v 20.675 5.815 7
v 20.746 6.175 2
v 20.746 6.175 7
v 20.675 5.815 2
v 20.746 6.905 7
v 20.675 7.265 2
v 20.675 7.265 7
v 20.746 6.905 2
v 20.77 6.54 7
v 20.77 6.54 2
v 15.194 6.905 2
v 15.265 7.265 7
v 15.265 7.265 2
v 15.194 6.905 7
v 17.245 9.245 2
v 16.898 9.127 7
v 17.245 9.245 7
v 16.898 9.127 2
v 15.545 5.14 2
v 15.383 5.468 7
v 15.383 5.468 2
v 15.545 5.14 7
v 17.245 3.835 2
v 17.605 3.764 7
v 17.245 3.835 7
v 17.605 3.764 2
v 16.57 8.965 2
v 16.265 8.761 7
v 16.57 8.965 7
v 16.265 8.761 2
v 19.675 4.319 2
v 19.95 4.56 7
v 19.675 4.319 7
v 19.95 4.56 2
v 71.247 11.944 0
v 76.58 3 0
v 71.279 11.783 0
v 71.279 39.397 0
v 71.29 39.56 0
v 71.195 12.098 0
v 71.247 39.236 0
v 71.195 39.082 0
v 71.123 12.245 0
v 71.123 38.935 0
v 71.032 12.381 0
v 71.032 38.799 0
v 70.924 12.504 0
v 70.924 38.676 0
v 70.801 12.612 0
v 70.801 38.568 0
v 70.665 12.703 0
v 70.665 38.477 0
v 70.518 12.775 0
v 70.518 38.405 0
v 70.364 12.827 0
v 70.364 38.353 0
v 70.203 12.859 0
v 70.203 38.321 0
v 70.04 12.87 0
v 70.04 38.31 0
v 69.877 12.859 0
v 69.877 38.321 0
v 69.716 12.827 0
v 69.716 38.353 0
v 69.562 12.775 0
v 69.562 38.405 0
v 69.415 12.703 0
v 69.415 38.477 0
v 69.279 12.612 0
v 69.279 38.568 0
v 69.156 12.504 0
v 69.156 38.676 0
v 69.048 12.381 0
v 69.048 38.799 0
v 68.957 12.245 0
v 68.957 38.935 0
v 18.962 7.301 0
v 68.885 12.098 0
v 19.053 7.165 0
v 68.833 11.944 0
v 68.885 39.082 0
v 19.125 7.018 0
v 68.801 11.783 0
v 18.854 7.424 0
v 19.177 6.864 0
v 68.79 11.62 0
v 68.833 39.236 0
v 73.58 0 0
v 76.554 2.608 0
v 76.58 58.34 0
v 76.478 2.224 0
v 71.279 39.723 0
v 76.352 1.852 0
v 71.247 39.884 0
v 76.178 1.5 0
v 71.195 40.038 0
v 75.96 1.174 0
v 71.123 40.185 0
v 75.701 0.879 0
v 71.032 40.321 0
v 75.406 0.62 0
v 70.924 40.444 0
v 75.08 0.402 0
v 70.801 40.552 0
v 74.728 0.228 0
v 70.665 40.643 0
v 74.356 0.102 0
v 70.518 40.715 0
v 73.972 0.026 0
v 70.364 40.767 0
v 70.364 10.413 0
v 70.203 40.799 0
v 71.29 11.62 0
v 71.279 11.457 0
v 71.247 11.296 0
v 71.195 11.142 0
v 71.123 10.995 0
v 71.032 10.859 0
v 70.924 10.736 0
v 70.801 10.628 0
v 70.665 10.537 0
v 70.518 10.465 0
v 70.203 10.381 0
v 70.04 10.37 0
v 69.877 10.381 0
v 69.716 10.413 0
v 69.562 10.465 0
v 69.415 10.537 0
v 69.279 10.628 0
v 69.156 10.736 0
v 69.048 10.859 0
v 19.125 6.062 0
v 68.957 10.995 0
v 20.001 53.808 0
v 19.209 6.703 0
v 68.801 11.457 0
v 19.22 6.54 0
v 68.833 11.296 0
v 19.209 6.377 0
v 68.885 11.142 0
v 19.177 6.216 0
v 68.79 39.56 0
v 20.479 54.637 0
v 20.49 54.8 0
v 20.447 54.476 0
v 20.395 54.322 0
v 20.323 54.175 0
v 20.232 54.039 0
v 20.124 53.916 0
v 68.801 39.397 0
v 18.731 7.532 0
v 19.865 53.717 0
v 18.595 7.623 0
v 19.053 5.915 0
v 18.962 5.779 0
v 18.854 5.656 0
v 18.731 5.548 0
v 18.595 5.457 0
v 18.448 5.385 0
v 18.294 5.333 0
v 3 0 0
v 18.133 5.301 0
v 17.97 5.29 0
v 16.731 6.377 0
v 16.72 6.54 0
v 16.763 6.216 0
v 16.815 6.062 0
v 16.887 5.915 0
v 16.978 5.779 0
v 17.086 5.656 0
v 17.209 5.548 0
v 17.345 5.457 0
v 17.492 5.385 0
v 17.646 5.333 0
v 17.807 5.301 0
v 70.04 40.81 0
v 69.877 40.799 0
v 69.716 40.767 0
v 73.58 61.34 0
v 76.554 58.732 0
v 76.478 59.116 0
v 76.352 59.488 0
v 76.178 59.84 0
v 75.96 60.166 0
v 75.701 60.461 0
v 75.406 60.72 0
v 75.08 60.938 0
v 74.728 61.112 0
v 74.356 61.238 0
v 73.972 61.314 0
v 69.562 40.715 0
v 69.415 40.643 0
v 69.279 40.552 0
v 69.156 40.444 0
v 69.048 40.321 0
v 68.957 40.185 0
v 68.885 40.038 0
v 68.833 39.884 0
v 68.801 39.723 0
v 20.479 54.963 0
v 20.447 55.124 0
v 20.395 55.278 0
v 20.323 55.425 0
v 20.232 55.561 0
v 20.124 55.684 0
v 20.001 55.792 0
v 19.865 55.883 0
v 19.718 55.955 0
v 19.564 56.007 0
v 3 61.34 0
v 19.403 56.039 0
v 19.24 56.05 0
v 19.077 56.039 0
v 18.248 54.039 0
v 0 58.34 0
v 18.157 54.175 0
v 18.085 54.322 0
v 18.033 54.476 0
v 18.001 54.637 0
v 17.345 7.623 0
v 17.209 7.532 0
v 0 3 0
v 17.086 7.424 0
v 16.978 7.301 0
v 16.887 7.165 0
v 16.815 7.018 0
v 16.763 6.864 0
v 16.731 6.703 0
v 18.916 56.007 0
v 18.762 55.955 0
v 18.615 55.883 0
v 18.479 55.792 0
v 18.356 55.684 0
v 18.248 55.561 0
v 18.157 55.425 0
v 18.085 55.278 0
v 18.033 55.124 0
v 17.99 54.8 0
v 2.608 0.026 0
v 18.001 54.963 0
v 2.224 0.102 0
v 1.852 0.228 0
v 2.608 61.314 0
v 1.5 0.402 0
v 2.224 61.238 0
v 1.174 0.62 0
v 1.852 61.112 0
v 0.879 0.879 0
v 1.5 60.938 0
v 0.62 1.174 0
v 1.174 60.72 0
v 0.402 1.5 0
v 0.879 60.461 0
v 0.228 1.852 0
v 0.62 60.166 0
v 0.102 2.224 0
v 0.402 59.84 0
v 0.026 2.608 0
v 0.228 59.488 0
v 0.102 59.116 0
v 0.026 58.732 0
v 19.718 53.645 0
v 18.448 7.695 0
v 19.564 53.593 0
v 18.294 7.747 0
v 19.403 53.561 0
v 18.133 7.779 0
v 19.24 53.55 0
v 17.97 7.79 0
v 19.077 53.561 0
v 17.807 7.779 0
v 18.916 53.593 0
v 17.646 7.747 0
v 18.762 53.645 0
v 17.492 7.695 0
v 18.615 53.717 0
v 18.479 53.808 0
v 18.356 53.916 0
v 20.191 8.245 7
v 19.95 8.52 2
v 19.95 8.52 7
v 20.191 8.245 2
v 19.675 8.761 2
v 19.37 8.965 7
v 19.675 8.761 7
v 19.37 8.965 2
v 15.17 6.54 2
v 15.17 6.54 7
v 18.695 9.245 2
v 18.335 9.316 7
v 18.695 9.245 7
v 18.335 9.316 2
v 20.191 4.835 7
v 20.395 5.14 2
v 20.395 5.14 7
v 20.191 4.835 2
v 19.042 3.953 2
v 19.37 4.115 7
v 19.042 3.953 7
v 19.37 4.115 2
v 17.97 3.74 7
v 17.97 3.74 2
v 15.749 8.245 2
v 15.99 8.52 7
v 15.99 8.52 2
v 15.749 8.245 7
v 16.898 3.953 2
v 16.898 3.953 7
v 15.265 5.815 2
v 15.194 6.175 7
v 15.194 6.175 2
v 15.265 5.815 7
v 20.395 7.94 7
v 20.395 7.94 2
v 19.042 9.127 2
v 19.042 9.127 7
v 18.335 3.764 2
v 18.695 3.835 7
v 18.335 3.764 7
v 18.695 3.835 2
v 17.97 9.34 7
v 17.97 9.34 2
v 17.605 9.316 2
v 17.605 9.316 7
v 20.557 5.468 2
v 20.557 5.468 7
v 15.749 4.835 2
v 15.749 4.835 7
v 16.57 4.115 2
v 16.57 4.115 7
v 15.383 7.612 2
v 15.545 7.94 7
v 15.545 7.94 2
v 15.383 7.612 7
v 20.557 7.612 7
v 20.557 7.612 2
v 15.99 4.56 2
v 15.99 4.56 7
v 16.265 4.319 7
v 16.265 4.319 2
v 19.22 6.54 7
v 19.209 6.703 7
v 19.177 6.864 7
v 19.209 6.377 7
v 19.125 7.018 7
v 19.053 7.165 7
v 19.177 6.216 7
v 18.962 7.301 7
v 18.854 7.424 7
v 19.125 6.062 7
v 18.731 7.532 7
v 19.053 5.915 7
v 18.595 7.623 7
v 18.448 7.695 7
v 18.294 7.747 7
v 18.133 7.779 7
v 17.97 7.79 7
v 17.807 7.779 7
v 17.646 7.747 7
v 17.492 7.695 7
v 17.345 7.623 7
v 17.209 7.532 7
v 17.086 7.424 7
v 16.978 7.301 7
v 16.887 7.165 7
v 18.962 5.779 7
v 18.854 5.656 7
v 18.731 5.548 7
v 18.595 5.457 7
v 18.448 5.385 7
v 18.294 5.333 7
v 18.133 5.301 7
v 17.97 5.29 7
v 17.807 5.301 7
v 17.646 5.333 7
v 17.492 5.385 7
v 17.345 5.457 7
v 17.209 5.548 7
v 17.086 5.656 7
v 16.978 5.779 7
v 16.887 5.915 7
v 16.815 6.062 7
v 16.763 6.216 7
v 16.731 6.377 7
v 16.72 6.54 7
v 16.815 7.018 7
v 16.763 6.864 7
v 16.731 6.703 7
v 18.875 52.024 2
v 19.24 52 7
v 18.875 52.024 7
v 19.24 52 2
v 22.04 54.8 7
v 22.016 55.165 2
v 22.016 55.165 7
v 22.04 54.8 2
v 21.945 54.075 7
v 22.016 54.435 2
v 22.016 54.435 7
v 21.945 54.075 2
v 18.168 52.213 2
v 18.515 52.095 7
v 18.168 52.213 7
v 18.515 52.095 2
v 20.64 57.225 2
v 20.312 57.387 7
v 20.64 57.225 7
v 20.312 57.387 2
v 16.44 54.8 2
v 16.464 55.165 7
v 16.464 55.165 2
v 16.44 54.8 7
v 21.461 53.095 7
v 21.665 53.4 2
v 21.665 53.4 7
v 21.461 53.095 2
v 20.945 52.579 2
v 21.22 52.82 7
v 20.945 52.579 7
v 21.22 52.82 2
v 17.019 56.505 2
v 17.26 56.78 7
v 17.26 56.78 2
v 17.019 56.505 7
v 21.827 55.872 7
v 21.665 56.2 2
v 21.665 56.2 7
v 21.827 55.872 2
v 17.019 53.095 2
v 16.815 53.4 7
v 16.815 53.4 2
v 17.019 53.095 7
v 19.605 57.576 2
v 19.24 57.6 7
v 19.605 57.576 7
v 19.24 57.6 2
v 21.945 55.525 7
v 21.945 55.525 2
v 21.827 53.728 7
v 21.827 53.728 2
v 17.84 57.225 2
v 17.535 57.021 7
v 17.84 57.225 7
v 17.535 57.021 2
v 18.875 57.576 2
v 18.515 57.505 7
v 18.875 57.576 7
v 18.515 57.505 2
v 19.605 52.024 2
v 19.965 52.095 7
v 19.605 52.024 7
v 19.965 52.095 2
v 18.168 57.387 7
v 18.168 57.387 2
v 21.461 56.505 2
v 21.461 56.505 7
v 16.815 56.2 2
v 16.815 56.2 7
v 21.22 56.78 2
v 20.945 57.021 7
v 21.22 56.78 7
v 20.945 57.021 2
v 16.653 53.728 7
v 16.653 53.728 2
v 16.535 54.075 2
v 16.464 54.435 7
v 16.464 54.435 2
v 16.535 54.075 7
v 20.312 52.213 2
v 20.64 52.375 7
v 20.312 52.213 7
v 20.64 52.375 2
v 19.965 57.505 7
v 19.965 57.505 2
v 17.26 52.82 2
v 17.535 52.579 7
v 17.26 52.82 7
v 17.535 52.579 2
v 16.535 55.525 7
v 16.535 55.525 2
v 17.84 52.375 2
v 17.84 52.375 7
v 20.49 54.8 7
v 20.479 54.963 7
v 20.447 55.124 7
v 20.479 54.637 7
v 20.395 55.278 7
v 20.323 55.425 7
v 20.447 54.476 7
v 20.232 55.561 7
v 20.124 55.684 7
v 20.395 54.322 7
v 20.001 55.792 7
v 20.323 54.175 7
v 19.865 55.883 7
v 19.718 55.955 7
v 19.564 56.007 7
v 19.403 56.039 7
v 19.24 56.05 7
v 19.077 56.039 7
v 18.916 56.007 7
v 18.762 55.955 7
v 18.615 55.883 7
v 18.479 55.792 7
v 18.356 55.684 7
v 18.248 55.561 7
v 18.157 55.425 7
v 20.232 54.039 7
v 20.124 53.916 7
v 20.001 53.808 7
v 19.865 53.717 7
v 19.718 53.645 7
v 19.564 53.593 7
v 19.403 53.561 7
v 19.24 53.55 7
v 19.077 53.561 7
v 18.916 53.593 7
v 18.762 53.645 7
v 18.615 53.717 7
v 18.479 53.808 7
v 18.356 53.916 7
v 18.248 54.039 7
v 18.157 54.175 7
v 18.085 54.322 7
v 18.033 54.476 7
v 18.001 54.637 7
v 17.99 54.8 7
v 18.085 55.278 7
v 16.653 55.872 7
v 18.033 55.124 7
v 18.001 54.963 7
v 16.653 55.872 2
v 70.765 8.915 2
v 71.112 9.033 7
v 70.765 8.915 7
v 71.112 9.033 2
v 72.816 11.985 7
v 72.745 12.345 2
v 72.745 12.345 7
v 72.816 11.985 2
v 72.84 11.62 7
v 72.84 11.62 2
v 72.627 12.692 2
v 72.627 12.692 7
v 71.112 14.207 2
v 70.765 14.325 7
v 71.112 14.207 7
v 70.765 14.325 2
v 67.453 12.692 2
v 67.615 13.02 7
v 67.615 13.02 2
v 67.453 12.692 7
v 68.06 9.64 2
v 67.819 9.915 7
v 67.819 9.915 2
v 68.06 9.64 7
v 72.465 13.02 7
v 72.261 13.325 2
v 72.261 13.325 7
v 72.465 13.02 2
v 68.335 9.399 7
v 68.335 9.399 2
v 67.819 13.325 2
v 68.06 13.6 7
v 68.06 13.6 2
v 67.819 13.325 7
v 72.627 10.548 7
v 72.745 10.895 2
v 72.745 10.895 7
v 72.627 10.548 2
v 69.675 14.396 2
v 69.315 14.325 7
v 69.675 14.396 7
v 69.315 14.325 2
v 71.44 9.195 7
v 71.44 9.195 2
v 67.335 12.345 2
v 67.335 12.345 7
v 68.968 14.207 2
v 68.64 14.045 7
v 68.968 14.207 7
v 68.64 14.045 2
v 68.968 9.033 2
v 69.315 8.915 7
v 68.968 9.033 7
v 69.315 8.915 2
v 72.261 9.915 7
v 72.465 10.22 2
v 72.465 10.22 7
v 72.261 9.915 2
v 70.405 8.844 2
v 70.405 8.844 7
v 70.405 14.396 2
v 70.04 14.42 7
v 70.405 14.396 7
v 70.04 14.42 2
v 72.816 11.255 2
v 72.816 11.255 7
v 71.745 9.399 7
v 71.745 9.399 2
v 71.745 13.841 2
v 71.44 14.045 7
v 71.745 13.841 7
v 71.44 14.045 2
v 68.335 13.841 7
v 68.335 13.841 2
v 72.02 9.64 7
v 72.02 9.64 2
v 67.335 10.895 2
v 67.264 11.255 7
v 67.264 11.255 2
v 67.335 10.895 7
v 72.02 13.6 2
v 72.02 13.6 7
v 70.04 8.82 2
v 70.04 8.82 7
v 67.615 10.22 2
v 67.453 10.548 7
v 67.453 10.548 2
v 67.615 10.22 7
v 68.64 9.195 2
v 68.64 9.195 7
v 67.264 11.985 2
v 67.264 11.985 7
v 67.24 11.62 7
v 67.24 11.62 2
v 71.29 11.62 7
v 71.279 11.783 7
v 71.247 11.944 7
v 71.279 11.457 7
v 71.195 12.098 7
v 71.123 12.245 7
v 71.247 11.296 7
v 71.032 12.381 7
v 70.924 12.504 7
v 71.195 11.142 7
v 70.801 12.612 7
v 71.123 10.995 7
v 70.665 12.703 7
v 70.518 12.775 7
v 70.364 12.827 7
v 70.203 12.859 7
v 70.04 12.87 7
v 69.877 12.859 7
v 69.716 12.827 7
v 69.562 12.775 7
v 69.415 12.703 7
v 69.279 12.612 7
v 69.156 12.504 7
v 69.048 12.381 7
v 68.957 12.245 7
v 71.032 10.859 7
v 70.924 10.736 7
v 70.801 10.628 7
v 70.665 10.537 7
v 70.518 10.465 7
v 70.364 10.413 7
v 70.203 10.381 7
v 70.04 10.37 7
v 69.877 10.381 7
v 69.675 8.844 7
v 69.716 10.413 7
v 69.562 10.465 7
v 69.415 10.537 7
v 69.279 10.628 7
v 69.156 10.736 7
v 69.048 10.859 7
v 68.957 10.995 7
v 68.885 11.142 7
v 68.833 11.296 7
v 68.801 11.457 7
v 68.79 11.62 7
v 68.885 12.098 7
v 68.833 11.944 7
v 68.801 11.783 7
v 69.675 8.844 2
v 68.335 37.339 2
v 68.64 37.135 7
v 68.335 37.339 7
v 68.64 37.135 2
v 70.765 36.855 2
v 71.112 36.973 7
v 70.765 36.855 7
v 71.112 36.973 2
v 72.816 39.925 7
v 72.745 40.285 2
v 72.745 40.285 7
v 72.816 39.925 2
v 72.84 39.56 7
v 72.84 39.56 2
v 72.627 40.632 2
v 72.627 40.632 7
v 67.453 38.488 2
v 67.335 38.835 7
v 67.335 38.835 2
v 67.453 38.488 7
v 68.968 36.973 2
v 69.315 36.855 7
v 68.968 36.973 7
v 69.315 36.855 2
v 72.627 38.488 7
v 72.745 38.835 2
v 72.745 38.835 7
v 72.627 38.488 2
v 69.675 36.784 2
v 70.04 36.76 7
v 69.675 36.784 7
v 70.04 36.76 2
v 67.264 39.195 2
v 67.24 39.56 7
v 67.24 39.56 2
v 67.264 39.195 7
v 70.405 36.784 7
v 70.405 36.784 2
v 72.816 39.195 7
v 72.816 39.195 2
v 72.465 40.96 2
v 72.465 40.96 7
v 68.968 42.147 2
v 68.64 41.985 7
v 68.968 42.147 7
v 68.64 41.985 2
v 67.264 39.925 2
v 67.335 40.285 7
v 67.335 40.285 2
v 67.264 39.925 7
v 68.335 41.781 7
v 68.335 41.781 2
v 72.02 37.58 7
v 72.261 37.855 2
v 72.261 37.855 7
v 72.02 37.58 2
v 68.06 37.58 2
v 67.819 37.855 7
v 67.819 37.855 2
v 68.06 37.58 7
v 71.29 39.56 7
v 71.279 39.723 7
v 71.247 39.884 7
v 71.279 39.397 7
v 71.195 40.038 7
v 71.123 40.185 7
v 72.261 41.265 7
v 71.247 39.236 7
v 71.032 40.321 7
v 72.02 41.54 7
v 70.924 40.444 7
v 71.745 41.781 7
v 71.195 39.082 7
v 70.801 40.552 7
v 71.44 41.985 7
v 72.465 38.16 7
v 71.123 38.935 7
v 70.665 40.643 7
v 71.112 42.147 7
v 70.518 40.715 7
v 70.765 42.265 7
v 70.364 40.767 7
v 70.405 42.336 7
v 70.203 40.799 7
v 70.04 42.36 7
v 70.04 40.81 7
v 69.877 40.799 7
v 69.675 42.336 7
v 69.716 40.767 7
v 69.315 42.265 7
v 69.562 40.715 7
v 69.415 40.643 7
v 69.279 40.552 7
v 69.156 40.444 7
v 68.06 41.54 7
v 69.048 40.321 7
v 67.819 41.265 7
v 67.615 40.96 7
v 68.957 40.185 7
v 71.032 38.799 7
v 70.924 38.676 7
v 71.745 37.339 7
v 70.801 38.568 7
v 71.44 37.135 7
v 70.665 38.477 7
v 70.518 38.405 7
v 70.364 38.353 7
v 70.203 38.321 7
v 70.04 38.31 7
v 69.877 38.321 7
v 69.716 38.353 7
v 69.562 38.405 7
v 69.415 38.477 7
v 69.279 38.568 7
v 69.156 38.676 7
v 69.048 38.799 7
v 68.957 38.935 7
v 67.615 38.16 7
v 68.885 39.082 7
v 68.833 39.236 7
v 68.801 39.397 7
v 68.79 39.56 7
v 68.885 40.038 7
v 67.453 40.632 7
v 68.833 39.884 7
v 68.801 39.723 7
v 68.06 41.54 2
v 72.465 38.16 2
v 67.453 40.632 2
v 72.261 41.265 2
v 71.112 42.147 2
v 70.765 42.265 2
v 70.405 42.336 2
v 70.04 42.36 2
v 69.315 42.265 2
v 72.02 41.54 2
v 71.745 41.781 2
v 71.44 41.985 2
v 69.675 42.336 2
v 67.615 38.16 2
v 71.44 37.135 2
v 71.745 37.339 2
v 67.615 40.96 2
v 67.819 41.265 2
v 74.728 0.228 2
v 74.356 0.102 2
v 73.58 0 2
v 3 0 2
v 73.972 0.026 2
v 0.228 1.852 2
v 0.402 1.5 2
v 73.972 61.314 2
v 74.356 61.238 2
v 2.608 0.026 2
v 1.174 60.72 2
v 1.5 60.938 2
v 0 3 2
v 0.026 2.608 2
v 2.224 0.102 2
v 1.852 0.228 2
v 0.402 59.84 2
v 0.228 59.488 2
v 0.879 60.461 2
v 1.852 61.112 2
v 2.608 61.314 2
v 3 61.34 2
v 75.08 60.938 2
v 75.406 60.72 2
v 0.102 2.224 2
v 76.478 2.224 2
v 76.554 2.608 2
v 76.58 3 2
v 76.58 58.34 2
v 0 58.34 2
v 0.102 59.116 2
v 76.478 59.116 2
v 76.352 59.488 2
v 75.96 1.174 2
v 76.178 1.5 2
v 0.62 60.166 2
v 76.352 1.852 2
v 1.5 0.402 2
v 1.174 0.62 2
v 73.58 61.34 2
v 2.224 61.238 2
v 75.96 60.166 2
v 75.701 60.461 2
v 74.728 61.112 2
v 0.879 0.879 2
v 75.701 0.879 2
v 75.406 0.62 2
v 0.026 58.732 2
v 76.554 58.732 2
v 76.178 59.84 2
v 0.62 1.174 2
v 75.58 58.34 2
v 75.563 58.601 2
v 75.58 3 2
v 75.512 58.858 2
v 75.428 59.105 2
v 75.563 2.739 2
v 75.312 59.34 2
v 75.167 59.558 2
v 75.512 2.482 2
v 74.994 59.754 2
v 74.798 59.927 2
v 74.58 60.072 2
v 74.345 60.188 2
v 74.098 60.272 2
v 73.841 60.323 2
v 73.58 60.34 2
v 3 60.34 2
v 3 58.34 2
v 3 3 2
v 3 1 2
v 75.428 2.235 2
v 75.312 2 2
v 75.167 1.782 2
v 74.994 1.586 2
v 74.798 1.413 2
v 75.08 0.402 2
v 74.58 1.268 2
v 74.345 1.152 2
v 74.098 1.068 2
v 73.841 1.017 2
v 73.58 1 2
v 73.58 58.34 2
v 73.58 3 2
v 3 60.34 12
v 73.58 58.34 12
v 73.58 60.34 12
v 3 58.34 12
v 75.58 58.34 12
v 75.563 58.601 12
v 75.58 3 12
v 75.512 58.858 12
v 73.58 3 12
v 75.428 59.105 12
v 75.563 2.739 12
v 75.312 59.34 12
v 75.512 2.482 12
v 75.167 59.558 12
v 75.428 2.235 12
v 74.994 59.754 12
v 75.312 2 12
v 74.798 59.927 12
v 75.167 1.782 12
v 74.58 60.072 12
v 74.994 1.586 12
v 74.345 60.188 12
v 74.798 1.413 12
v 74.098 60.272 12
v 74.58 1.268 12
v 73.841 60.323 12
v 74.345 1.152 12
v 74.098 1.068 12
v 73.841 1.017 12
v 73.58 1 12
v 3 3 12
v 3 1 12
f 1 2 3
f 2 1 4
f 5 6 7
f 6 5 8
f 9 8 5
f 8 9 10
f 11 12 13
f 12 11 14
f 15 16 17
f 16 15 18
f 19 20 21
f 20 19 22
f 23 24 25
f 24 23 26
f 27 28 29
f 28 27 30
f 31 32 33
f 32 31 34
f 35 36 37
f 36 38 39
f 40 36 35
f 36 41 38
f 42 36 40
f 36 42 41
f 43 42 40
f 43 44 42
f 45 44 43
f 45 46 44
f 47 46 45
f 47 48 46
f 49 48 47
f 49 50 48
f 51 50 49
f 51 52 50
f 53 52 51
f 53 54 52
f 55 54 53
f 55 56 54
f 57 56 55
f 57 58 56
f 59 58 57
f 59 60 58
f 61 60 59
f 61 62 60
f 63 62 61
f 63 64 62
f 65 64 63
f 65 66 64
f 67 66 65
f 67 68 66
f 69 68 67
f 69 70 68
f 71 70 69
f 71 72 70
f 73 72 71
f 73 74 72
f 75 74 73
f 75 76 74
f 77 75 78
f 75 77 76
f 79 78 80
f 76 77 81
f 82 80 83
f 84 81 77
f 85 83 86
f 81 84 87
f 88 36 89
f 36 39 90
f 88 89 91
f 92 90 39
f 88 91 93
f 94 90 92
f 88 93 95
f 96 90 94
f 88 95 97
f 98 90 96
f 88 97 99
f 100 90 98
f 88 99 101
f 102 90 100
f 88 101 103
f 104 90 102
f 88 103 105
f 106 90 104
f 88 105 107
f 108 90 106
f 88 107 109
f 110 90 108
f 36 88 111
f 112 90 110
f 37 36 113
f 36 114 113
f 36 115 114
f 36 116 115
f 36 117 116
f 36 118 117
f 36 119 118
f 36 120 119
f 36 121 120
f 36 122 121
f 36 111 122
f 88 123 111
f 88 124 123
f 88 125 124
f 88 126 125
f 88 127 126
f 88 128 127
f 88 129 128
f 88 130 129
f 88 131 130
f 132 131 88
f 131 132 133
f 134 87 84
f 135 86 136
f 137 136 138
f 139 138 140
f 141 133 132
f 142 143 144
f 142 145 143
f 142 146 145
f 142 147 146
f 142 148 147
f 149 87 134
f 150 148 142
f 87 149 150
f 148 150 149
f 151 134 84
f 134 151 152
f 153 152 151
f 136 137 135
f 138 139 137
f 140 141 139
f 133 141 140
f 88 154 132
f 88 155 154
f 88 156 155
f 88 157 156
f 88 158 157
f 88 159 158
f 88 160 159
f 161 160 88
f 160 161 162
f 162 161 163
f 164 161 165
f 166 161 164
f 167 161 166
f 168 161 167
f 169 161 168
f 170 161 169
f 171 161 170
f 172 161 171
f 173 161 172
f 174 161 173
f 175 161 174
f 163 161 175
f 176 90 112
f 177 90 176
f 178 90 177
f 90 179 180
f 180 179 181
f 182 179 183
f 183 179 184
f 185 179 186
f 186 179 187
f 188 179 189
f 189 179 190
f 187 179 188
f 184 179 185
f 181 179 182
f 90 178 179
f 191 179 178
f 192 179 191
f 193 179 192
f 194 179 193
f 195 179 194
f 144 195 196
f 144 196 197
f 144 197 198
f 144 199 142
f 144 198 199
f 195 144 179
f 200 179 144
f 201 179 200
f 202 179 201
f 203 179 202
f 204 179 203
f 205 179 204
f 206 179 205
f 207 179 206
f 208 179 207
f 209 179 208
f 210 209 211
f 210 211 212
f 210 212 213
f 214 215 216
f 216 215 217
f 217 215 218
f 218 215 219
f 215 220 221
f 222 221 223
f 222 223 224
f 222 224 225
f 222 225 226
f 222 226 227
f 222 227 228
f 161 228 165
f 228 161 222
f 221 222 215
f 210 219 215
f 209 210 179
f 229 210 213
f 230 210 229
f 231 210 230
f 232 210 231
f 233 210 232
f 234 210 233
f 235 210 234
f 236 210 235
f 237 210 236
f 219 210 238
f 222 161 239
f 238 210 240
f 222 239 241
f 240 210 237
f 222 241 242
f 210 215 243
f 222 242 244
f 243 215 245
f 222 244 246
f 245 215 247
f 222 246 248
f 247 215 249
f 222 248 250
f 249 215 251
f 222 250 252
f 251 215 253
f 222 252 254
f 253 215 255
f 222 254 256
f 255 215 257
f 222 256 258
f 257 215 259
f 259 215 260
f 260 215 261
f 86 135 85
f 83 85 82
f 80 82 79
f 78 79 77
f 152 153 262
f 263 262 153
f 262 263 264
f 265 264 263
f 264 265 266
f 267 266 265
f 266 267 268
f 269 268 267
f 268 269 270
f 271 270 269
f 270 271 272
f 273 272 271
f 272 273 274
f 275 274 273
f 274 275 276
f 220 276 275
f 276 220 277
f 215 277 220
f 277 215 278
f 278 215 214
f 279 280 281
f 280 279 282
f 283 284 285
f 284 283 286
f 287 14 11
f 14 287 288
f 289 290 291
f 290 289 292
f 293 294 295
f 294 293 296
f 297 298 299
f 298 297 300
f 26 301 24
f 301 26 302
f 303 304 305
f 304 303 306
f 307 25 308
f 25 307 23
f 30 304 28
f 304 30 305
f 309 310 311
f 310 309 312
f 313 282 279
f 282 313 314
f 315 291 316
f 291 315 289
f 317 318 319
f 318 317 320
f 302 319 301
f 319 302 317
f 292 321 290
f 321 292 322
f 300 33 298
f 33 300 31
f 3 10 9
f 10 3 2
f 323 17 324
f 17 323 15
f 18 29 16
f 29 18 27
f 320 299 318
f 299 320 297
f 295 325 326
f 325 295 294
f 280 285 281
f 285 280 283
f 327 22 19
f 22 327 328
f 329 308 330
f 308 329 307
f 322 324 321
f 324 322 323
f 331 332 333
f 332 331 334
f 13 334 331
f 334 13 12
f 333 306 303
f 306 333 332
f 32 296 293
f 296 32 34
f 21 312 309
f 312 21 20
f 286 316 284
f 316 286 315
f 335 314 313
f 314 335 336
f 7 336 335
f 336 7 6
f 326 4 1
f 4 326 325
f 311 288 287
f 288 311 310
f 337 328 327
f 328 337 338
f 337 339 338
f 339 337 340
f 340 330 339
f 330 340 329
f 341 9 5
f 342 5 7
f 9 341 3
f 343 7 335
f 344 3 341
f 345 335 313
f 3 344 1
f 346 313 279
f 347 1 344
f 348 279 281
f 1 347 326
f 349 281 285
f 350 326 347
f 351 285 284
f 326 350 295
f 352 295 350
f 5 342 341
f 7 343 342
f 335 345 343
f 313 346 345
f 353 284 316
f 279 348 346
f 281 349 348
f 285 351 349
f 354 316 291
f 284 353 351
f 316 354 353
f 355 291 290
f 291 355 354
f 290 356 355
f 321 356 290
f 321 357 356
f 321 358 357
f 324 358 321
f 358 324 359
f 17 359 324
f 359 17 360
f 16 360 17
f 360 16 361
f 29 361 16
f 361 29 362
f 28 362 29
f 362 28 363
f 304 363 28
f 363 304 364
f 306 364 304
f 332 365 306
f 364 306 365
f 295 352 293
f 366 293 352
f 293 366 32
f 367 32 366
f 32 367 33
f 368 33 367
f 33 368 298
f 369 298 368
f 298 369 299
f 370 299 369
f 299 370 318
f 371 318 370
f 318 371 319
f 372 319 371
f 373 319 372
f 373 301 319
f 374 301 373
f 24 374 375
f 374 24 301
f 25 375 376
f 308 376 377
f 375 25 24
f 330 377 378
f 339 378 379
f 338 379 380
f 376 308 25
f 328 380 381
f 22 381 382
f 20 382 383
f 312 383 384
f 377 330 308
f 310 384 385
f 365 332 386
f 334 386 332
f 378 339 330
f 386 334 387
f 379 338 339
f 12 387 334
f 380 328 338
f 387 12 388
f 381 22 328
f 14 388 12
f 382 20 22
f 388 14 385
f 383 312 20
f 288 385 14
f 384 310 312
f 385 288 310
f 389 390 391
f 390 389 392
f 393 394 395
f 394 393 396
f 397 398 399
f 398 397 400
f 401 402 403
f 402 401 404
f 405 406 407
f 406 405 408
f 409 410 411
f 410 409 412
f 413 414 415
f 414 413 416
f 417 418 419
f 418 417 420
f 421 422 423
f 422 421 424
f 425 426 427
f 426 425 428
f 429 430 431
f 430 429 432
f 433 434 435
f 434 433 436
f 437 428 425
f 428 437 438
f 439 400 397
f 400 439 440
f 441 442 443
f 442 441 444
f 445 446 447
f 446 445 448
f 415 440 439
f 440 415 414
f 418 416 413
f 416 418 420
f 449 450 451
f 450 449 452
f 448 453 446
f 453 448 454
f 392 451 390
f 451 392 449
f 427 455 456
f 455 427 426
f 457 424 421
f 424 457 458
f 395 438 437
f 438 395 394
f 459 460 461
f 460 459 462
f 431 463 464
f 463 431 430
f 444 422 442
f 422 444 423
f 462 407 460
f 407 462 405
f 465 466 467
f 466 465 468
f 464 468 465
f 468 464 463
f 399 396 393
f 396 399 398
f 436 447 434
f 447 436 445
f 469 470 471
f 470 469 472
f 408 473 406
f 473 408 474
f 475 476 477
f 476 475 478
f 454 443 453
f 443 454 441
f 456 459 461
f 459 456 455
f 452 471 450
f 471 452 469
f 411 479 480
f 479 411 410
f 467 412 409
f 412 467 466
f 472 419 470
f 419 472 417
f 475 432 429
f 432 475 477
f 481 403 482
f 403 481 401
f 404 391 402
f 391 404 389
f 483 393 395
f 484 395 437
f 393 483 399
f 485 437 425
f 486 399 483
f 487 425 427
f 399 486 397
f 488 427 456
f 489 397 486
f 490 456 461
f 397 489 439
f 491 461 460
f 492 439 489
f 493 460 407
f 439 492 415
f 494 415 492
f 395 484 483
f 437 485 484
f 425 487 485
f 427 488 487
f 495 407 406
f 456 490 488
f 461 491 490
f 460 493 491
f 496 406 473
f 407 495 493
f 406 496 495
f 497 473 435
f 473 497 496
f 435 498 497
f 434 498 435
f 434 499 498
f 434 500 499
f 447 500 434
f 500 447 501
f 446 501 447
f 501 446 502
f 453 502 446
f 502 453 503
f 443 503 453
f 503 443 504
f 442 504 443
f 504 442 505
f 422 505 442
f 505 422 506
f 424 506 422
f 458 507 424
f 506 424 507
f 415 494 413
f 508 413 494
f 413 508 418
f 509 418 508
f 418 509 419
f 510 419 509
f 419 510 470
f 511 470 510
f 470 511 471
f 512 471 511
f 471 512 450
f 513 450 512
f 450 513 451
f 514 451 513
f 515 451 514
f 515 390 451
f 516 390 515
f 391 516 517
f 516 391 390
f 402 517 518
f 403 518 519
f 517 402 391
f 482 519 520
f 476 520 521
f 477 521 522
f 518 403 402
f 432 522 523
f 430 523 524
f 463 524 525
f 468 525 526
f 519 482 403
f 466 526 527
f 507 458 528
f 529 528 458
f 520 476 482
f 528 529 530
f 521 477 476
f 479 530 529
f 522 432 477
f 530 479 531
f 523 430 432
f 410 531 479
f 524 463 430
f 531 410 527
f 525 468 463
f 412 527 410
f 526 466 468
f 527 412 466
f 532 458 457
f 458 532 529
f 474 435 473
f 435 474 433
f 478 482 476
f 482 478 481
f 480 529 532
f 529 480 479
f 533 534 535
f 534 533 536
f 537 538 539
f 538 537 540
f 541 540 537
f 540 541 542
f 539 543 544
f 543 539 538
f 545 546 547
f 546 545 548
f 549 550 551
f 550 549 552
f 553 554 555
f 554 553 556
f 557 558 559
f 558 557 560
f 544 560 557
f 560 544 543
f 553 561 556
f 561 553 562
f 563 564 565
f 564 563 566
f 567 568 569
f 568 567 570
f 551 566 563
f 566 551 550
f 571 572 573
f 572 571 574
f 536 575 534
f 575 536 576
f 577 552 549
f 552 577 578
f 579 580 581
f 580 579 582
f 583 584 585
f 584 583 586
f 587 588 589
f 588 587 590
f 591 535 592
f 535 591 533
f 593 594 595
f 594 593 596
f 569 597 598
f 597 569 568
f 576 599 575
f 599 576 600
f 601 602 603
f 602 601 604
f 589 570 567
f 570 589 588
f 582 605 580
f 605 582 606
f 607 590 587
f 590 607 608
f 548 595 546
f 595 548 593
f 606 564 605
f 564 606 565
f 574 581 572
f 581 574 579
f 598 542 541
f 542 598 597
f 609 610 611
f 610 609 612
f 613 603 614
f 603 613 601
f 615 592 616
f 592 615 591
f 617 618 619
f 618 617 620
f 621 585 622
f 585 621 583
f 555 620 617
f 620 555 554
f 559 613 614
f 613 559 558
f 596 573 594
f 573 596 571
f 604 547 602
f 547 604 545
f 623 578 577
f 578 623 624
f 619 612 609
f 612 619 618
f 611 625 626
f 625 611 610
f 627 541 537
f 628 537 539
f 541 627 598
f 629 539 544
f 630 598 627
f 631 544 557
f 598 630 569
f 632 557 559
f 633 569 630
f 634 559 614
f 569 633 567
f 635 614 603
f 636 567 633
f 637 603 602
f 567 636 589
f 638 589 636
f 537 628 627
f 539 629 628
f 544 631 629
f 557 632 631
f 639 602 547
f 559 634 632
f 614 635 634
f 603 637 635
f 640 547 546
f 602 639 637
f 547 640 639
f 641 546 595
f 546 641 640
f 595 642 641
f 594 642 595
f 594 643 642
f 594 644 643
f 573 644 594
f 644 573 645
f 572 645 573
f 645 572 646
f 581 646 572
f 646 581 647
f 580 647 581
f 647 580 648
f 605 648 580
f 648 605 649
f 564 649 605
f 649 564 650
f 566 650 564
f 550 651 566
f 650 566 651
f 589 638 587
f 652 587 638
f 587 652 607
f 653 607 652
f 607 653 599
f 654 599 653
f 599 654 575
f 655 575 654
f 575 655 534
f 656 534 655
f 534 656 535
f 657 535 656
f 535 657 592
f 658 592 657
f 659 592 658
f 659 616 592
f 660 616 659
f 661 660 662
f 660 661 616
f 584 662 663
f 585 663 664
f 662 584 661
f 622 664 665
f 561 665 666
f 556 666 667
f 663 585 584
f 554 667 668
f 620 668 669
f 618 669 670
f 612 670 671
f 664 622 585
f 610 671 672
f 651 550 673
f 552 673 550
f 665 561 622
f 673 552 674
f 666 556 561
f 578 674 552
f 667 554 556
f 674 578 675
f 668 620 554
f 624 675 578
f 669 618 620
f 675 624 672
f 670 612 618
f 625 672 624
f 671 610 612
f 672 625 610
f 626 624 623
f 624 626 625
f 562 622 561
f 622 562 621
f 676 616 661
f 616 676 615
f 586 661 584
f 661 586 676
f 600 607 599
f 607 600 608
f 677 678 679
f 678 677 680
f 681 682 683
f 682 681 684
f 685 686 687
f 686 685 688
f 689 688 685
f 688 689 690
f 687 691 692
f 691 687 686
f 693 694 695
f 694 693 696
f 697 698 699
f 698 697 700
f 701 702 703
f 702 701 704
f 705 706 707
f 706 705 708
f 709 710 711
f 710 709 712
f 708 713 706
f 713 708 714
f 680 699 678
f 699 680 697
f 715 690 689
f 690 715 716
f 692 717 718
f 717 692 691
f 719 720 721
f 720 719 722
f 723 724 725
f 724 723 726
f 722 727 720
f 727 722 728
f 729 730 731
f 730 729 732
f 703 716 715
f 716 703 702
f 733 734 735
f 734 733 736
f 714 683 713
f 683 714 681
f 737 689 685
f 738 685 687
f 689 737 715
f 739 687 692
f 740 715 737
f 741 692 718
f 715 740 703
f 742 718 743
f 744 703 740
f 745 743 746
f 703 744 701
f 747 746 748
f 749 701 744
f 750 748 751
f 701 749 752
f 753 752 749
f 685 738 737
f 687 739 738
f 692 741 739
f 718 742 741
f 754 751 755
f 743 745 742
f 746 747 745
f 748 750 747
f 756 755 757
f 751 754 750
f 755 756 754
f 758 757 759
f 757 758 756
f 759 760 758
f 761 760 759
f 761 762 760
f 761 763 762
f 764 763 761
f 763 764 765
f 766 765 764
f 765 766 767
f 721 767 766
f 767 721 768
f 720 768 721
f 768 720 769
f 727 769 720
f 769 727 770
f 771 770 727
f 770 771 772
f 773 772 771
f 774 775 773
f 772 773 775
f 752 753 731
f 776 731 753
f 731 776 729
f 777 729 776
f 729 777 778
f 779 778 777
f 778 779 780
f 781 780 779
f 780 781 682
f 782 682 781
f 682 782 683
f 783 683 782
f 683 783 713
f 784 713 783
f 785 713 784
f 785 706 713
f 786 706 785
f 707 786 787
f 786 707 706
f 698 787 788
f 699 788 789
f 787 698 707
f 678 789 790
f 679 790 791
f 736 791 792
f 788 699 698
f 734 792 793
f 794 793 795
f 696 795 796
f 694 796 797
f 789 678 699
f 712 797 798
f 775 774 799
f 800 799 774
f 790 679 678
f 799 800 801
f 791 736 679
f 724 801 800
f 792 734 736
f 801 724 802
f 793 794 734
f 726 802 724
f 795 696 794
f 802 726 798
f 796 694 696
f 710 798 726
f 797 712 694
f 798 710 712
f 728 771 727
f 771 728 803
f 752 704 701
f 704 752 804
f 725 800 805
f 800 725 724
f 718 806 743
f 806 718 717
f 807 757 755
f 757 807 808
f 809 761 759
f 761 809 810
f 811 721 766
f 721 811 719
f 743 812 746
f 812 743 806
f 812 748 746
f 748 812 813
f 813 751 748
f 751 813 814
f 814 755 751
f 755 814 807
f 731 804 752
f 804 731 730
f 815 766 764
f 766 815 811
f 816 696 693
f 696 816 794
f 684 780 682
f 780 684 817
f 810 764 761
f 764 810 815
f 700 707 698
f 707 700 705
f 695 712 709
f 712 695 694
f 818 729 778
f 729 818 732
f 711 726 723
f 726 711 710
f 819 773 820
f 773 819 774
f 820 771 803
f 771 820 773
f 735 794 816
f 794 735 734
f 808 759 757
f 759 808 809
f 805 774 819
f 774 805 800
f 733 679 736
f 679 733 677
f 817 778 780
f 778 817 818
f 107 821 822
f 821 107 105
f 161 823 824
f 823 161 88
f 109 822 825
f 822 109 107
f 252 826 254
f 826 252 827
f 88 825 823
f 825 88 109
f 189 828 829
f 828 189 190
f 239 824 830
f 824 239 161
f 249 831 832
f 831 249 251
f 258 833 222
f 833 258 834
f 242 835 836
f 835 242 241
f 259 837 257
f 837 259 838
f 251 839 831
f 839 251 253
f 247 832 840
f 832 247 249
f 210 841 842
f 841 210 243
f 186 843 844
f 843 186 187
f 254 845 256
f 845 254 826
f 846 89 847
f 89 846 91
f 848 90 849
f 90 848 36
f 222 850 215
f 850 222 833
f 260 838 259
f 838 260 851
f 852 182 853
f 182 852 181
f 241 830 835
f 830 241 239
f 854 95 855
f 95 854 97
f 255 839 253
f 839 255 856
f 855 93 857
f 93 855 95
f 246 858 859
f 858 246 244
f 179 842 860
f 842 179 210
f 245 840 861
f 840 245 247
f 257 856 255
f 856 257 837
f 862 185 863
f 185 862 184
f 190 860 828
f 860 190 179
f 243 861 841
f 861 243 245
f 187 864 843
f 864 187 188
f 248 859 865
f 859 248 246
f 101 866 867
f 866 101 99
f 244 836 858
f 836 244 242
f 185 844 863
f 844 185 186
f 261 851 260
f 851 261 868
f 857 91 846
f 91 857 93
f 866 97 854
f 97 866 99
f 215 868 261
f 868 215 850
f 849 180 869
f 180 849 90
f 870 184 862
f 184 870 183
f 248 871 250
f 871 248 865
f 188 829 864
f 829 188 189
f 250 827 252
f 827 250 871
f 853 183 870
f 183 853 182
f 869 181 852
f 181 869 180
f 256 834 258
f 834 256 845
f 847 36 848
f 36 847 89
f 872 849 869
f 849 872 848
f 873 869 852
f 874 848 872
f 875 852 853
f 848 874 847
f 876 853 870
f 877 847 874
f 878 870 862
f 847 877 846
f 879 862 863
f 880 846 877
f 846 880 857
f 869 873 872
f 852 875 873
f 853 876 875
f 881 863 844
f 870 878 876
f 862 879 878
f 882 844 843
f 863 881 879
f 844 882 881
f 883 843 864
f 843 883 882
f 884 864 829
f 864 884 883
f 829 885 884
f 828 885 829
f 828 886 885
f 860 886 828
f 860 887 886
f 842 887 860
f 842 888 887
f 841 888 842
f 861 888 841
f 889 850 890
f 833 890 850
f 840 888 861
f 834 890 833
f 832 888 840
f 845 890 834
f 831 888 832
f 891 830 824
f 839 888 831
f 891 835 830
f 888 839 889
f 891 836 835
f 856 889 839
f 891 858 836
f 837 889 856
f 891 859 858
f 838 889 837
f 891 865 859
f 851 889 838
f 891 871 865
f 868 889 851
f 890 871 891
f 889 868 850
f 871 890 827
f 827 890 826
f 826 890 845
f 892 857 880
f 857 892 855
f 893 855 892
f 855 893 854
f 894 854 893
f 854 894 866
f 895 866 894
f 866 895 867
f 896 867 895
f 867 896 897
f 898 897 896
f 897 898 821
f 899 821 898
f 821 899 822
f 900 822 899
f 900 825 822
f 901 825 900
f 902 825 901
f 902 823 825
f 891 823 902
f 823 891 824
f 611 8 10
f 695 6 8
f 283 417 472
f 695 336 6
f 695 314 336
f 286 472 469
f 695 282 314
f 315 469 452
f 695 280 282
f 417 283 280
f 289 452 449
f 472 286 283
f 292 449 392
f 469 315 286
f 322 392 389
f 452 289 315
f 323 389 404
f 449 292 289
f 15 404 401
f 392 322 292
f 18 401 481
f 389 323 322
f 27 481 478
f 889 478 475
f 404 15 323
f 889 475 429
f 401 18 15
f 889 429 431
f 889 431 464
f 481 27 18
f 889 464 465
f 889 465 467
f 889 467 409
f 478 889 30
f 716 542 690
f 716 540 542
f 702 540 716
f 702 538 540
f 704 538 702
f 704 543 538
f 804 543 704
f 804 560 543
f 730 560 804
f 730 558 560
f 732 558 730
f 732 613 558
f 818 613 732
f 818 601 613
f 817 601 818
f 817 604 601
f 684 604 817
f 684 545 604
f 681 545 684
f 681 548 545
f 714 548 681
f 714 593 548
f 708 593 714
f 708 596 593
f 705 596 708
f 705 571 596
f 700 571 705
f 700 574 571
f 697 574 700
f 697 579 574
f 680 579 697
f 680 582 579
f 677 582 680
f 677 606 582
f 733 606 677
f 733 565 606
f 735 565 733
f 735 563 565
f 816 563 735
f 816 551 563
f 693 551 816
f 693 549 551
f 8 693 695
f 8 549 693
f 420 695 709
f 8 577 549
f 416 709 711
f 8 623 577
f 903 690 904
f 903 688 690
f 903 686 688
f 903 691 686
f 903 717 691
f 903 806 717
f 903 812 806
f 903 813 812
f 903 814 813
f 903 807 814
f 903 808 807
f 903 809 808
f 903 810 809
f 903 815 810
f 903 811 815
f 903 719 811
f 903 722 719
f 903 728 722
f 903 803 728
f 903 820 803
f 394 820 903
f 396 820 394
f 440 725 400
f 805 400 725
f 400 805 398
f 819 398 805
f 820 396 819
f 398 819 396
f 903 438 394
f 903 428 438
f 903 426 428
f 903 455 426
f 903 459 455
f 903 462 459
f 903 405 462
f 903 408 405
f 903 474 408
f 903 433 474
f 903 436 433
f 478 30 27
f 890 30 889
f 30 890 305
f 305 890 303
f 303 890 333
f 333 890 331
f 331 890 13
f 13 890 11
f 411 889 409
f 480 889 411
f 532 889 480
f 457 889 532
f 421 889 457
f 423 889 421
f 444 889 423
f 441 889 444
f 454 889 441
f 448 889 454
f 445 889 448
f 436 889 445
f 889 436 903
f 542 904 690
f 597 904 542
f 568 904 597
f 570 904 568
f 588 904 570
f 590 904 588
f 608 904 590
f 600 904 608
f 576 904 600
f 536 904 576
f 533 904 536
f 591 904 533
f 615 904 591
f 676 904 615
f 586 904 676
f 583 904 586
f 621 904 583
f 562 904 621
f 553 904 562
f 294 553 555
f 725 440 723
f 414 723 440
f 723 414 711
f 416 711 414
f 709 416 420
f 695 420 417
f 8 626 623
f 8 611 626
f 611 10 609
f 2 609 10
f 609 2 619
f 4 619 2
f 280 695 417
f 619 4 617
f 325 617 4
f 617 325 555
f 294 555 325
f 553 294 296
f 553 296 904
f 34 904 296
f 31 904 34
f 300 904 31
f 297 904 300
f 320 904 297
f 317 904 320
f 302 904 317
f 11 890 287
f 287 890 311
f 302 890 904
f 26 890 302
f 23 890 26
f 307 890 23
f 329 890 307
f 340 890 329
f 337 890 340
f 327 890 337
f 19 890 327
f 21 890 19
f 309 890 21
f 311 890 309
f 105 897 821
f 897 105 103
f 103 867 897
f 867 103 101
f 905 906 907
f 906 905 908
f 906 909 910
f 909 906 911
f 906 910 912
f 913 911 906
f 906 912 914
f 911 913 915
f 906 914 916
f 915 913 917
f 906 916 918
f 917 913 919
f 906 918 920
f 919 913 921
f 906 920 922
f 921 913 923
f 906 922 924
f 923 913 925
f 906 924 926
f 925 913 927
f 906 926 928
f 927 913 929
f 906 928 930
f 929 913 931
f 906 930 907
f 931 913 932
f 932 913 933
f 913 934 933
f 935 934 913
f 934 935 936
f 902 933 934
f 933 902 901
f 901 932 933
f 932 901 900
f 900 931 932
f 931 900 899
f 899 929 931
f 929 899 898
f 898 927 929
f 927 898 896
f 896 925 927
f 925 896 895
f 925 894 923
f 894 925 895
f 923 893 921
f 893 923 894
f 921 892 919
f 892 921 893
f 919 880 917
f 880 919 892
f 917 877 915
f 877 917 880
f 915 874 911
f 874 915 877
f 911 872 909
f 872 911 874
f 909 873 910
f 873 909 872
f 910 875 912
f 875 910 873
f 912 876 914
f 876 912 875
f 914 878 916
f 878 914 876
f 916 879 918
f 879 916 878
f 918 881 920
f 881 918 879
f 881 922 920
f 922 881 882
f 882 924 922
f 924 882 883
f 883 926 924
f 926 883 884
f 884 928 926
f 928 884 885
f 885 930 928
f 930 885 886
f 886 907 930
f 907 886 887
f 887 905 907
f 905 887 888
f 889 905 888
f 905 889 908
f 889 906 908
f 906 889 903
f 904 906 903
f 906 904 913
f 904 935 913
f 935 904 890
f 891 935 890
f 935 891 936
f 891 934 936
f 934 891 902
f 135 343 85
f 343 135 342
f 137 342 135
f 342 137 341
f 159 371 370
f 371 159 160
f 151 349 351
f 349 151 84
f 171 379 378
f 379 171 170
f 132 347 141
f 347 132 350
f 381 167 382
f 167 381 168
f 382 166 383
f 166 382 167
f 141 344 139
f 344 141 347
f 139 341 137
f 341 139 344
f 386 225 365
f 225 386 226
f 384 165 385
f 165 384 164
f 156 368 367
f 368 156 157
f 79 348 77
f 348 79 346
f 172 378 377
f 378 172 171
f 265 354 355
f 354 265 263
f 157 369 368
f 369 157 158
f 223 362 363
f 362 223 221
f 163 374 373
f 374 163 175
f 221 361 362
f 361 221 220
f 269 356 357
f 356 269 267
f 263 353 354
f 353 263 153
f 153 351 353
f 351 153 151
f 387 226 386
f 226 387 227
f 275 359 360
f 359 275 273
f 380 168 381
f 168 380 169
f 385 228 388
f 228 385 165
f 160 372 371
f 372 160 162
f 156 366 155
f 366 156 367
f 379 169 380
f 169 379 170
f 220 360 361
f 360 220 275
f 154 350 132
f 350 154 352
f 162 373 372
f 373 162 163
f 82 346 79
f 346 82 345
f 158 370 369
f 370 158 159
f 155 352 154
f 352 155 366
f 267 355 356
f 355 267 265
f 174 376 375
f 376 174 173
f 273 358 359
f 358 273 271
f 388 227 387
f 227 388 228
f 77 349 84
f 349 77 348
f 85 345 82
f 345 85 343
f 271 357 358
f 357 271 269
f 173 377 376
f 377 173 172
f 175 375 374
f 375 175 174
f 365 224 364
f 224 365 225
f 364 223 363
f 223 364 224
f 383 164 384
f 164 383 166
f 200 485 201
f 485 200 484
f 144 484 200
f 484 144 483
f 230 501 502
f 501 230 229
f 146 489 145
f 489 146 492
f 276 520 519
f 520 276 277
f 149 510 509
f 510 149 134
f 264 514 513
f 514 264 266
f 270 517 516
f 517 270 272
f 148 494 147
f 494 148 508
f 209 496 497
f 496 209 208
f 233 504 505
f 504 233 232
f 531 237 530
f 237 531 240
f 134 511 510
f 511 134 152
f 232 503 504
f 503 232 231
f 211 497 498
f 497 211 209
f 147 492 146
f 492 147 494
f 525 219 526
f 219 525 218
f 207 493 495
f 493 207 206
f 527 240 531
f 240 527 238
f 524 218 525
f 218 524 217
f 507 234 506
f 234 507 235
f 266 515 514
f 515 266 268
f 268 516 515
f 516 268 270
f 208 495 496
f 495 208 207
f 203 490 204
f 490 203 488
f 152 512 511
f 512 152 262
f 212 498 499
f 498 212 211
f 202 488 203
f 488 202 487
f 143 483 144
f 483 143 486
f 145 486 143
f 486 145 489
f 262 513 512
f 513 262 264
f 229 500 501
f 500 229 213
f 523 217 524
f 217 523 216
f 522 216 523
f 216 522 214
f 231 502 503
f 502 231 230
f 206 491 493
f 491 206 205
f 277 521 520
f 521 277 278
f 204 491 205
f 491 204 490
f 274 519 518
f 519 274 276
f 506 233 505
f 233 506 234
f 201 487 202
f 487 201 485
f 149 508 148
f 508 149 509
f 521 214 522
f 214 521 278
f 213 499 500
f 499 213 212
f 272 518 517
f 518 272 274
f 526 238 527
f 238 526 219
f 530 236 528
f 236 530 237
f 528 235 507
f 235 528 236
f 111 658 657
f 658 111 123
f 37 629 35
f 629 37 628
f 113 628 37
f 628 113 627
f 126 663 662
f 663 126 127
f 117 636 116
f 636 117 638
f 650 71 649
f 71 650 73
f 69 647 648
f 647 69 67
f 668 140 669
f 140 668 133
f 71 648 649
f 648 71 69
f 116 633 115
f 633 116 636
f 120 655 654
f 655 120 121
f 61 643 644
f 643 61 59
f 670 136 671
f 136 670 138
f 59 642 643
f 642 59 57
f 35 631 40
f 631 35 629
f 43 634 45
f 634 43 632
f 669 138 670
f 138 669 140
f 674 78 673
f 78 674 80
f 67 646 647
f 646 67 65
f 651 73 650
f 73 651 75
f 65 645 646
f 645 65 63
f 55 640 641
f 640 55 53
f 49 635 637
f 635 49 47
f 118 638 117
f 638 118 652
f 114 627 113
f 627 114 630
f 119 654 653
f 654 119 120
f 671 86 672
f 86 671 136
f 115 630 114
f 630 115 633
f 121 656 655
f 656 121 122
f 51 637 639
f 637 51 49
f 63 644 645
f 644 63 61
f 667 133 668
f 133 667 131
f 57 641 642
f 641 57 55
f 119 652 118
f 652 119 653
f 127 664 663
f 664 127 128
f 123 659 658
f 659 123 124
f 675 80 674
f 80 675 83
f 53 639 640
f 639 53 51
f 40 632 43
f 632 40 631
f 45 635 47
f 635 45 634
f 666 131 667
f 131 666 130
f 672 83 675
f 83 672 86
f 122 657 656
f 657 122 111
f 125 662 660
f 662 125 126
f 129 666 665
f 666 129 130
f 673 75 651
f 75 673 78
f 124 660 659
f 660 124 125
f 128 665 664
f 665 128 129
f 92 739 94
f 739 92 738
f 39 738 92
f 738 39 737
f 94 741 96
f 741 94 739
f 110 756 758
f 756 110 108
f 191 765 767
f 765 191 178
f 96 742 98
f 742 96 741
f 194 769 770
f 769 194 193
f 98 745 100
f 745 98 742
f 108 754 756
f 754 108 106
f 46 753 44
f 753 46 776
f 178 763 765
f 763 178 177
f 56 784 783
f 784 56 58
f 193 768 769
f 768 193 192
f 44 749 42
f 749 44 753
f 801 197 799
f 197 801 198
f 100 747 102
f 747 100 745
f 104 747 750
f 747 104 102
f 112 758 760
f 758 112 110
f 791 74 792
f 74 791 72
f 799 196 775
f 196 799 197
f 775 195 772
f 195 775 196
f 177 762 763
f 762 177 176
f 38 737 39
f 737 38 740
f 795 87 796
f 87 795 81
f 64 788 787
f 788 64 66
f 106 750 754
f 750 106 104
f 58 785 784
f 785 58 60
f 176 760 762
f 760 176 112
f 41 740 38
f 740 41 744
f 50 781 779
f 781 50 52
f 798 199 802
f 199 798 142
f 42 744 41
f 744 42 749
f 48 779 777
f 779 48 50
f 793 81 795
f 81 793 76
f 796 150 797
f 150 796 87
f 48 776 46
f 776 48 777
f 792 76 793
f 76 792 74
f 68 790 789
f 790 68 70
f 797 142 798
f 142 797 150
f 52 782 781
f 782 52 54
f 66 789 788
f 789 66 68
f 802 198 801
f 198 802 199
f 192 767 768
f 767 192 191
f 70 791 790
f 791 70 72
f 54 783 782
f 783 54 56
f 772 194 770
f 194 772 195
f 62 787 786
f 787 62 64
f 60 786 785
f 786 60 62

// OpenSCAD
// Uno bumper tray - The Build Book
// https://tobno683.github.io/arduino-build-book/basics/printing.html#prints
//
// Open at the board's x = 0 end, where the USB and power jacks overhang.
// Hole centres are measured from that corner of the board.
//
// Millimetres. Change the numbers at the top and render (F6); everything
// below follows from them. Written by tools/make-prints.js from the same
// numbers as the STL next to it.

/* [Board] */
board = [68.58, 53.34];
holes = [[13.97, 2.54], [15.24, 50.8], [66.04, 7.62], [66.04, 35.56]];

/* [Tray] */
clearance = 1;   // gap between the board edge and the wall
wall = 2;
ledge = 1;       // the floor reaches this far past the wall
corner_r = 3;
floor_t = 2;
wall_h = 10;     // above the floor - keep it below the header tops so jumper wires still plug in

/* [Standoffs] */
standoff_d = 5.6;
standoff_h = 5;   // above the floor
standoff_hole = 2.5;   // M3 screws cutting their own thread

/* [Hidden] */
$fn = 48;

c0 = ledge + wall + clearance;   // where the board's corner sits
outer = [board[0] + 2 * c0, board[1] + 2 * c0];

module rounded_rect(size, r) {
  translate([r, r]) offset(r = r) square([size[0] - 2 * r, size[1] - 2 * r]);
}

difference() {
  union() {
    linear_extrude(floor_t) rounded_rect(outer, corner_r);
    translate([0, 0, floor_t]) linear_extrude(wall_h) difference() {
      translate([ledge, ledge]) rounded_rect([outer[0] - 2 * ledge, outer[1] - 2 * ledge], corner_r - ledge);
      translate([ledge + wall, ledge + wall]) square([outer[0] - 2 * (ledge + wall), outer[1] - 2 * (ledge + wall)]);
      translate([-1, -1]) square([ledge + wall + 1, outer[1] + 2]);   // the open end
    }
    for (h = holes)
      translate([c0 + h[0], c0 + h[1], 0]) cylinder(d = standoff_d, h = floor_t + standoff_h);
  }
  for (h = holes)
    translate([c0 + h[0], c0 + h[1], -1]) cylinder(d = standoff_hole, h = floor_t + standoff_h + 2);
}
